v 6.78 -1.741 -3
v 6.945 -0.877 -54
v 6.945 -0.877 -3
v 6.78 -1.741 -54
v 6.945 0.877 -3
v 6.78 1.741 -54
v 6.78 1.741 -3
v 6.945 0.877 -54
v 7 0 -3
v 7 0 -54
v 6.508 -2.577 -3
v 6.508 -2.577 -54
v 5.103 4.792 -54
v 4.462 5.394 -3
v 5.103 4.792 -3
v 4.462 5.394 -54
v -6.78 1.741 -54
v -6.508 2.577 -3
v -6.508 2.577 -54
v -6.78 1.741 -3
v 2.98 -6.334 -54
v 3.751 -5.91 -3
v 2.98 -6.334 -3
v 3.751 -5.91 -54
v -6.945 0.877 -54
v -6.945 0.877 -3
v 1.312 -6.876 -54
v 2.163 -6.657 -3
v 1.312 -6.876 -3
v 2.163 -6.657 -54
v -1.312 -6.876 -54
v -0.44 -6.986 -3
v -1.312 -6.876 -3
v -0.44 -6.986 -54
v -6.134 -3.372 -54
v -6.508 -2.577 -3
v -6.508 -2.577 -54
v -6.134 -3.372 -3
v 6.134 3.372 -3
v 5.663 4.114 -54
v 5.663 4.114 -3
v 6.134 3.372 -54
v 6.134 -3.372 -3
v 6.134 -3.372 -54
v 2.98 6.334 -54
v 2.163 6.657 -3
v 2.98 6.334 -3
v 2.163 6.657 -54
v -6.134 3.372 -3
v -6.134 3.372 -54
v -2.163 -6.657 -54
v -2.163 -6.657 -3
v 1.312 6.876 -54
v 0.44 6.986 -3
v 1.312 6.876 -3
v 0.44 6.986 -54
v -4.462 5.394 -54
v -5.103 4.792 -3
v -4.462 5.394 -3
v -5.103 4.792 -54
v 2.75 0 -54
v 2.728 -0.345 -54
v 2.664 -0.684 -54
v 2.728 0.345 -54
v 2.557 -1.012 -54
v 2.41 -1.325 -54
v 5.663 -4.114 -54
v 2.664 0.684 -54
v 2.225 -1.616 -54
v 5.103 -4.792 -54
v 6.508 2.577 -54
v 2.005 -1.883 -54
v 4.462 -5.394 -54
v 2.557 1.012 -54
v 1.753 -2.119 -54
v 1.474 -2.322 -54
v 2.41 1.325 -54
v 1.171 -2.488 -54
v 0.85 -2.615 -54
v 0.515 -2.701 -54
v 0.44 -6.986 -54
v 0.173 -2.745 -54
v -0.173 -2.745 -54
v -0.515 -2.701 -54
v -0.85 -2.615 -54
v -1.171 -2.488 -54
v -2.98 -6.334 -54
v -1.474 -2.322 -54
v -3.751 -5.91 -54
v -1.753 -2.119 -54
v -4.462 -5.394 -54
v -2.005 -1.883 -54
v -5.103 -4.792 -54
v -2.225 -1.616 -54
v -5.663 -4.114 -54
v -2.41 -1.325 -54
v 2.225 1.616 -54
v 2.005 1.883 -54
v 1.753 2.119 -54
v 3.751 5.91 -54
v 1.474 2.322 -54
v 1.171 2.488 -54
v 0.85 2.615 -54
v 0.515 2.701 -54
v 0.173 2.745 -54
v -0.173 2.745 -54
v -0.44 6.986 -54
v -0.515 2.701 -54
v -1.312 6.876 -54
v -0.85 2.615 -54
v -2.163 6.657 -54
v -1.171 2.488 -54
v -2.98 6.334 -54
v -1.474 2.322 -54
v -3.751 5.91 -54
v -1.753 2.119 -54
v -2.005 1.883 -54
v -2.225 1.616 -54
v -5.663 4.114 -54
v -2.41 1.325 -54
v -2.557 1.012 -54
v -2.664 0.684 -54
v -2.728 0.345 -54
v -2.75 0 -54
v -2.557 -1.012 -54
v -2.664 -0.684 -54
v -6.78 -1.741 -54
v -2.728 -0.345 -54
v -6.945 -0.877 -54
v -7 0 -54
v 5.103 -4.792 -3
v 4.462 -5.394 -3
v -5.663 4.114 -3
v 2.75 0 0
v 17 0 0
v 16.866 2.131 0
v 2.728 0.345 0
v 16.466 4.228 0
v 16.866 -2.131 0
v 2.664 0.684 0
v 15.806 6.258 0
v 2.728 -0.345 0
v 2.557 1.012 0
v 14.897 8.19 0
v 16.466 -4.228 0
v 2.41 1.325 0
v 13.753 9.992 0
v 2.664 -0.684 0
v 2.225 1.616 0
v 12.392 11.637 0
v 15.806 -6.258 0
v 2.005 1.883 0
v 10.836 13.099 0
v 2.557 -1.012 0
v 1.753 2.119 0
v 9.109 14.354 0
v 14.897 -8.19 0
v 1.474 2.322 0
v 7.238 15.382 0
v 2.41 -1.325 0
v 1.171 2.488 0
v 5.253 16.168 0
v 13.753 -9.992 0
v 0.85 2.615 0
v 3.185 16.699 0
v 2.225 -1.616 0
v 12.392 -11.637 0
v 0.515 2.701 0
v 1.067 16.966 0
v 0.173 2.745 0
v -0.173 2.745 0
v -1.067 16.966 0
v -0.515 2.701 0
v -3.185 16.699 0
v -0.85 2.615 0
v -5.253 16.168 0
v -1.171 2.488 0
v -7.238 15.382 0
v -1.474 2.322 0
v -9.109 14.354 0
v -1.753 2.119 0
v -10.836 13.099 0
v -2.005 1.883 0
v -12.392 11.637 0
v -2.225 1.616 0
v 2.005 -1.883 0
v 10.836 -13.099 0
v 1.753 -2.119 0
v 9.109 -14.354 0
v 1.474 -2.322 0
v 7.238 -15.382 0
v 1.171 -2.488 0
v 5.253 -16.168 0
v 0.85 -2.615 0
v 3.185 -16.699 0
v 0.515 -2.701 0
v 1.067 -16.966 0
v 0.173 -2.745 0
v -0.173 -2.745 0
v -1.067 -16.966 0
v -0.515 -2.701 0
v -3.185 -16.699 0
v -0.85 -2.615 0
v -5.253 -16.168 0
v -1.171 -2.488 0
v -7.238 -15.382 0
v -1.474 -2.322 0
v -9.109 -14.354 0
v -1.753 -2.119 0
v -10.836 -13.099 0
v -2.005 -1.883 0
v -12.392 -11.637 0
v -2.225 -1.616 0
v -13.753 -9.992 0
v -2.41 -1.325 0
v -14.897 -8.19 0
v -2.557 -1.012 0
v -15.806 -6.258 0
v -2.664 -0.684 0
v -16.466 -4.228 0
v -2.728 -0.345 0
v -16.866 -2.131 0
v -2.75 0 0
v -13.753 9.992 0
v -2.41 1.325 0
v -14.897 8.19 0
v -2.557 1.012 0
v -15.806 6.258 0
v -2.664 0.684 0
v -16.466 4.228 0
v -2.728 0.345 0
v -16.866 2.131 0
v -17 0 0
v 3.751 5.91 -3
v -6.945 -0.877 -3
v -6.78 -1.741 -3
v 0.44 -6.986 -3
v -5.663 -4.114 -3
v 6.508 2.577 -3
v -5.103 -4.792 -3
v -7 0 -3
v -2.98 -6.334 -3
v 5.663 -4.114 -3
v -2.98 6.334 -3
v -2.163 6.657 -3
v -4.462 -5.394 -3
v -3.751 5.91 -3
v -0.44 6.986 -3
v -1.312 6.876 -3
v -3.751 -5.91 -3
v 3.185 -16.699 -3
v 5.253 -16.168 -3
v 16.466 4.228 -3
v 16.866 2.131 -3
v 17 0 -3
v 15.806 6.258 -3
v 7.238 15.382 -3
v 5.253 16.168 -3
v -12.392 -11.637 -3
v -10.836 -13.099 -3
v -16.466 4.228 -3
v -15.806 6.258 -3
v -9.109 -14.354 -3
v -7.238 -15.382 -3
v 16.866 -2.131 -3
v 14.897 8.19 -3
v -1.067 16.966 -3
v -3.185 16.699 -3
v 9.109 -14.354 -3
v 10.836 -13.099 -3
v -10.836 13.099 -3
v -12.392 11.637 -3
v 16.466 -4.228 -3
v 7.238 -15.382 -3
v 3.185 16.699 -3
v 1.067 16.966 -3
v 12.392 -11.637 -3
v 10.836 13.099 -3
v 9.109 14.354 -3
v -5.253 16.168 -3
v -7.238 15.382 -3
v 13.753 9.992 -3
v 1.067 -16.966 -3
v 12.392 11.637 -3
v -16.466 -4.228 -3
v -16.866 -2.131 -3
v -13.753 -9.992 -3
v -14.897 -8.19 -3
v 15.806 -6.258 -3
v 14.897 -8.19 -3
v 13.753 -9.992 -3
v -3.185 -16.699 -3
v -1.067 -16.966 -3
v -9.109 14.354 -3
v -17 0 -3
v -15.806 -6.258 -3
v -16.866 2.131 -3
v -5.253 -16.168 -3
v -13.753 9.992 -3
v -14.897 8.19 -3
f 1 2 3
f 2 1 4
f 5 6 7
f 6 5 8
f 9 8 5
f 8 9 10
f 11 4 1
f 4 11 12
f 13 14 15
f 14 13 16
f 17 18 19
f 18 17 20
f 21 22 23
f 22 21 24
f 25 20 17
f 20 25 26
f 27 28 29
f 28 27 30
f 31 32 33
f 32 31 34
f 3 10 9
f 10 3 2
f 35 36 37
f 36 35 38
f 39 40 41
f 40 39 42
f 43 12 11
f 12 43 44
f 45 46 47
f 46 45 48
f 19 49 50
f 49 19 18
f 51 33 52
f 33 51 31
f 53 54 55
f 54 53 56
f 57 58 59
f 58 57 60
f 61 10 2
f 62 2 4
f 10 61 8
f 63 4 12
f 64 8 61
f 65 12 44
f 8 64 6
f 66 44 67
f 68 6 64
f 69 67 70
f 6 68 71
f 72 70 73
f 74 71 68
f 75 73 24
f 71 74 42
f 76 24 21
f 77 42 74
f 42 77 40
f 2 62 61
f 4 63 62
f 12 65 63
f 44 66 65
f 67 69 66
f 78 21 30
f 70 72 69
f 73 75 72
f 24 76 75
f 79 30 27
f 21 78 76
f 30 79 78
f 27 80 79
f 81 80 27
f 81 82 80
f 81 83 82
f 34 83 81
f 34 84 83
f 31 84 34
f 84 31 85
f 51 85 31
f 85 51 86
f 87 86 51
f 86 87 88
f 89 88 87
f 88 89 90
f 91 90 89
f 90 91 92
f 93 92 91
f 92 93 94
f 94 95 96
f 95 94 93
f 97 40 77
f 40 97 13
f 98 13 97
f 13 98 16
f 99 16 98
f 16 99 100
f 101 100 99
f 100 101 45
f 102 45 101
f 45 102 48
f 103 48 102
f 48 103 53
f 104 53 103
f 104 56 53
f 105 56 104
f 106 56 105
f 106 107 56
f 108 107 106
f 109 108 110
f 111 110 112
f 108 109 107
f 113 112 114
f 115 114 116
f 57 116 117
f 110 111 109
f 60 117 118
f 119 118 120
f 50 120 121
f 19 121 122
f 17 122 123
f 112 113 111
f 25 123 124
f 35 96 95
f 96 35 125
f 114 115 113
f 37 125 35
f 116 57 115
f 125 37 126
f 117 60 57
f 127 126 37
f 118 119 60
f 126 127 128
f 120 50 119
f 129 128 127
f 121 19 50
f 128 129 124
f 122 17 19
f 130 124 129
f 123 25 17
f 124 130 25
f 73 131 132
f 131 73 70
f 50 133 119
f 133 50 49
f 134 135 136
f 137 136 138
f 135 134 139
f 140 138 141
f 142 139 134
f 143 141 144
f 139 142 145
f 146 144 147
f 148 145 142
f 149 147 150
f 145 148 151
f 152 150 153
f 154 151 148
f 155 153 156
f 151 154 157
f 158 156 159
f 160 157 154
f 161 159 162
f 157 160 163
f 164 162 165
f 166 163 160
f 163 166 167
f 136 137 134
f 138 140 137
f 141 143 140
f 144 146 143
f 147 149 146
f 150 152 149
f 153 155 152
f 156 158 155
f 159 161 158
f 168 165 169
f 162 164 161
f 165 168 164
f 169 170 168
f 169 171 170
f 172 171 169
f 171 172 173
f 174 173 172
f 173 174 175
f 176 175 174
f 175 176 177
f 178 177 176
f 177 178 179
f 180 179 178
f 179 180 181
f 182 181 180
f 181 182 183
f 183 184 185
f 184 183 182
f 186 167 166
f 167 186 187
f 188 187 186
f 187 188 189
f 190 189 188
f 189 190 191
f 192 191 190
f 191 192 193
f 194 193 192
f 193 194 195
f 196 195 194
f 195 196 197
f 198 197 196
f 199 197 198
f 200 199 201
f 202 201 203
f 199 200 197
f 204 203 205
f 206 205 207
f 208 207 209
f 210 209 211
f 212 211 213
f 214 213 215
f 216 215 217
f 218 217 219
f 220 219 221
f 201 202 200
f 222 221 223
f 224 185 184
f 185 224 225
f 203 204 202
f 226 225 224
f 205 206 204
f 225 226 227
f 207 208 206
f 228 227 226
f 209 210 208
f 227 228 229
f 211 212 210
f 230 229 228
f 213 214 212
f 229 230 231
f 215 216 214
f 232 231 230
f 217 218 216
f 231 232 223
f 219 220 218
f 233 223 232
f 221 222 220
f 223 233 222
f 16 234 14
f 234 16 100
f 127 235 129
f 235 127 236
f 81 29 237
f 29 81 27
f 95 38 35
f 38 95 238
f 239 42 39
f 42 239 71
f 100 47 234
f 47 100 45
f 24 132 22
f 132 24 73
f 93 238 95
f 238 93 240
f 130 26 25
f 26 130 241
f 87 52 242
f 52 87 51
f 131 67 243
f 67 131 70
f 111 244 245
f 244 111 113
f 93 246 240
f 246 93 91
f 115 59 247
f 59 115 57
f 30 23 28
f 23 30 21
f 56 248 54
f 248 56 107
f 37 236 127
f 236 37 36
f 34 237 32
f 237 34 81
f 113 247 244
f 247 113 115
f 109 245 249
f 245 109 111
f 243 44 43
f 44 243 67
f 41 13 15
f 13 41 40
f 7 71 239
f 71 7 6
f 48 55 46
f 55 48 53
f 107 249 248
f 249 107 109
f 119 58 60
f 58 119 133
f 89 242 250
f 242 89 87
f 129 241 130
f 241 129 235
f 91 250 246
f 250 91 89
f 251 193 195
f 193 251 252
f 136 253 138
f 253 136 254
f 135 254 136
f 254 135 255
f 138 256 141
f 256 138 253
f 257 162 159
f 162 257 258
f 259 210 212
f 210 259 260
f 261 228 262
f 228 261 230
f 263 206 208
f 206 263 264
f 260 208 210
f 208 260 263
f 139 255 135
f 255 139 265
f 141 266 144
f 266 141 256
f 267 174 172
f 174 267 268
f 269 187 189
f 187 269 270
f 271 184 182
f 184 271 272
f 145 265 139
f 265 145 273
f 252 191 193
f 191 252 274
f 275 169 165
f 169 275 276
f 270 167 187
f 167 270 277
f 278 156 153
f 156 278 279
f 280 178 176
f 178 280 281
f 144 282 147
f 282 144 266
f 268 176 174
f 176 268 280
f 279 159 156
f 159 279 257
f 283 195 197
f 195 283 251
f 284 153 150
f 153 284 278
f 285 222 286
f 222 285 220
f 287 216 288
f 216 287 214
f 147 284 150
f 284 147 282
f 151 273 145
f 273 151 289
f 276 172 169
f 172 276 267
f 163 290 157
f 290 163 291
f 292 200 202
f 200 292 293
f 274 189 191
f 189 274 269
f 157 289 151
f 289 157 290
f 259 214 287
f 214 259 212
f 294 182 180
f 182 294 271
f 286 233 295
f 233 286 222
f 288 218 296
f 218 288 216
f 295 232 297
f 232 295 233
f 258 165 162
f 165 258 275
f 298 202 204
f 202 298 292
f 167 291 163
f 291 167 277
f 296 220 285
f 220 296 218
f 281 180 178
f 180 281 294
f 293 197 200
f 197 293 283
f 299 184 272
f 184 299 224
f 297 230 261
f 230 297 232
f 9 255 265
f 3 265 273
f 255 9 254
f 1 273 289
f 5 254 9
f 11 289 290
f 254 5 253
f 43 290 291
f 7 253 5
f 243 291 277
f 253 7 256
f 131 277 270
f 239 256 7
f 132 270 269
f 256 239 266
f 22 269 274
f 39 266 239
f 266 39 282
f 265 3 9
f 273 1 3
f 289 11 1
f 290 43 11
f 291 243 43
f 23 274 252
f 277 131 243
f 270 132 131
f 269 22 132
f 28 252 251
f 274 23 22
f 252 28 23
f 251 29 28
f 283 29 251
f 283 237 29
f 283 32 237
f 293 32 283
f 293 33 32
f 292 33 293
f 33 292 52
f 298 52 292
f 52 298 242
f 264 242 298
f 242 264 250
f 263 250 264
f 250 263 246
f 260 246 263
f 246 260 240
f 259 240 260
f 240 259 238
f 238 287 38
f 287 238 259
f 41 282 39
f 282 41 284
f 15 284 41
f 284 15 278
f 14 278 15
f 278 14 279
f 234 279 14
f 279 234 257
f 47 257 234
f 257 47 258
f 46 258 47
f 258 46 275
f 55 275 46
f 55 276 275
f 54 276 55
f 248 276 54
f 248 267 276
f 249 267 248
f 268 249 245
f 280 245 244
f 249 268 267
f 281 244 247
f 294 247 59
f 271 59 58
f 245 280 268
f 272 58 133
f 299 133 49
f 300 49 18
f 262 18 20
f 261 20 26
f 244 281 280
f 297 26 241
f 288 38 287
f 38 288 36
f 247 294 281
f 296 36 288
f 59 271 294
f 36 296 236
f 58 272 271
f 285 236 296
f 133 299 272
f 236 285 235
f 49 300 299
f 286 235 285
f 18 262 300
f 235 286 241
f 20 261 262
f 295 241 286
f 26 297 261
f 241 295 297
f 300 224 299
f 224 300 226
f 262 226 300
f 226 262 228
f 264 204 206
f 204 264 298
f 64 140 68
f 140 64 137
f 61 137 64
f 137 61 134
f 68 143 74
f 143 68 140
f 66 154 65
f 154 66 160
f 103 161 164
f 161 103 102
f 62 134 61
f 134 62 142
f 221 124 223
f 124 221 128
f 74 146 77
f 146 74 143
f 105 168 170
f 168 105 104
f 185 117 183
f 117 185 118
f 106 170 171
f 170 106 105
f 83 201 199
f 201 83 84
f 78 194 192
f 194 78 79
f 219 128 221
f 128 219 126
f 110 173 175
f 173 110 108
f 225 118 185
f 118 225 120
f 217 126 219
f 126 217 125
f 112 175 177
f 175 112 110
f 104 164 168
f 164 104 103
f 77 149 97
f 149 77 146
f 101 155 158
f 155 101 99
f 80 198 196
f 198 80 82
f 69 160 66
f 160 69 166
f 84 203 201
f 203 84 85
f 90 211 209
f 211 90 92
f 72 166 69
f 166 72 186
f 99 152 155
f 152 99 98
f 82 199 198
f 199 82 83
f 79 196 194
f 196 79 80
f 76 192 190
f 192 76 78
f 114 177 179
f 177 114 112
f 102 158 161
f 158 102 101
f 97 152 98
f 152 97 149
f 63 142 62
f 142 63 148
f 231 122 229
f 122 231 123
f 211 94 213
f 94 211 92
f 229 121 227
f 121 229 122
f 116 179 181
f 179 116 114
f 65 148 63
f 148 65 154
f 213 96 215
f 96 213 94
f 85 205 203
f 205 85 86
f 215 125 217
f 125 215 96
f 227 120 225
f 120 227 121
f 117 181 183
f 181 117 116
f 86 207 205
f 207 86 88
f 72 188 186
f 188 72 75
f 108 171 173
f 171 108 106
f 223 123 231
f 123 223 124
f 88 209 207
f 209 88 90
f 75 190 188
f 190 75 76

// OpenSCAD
$fn = 50;


difference() {
	union() {
		translate(v = [0, 0, -54.0000000000]) {
			cylinder(h = 54, r = 7.0000000000);
		}
		translate(v = [0, 0, -3.0000000000]) {
			cylinder(h = 3, r = 17.0000000000);
		}
	}
	union() {
		#translate(v = [0, 0, -54]) {
			cylinder(h = 54, r = 2.7500000000);
		}
	}
}
